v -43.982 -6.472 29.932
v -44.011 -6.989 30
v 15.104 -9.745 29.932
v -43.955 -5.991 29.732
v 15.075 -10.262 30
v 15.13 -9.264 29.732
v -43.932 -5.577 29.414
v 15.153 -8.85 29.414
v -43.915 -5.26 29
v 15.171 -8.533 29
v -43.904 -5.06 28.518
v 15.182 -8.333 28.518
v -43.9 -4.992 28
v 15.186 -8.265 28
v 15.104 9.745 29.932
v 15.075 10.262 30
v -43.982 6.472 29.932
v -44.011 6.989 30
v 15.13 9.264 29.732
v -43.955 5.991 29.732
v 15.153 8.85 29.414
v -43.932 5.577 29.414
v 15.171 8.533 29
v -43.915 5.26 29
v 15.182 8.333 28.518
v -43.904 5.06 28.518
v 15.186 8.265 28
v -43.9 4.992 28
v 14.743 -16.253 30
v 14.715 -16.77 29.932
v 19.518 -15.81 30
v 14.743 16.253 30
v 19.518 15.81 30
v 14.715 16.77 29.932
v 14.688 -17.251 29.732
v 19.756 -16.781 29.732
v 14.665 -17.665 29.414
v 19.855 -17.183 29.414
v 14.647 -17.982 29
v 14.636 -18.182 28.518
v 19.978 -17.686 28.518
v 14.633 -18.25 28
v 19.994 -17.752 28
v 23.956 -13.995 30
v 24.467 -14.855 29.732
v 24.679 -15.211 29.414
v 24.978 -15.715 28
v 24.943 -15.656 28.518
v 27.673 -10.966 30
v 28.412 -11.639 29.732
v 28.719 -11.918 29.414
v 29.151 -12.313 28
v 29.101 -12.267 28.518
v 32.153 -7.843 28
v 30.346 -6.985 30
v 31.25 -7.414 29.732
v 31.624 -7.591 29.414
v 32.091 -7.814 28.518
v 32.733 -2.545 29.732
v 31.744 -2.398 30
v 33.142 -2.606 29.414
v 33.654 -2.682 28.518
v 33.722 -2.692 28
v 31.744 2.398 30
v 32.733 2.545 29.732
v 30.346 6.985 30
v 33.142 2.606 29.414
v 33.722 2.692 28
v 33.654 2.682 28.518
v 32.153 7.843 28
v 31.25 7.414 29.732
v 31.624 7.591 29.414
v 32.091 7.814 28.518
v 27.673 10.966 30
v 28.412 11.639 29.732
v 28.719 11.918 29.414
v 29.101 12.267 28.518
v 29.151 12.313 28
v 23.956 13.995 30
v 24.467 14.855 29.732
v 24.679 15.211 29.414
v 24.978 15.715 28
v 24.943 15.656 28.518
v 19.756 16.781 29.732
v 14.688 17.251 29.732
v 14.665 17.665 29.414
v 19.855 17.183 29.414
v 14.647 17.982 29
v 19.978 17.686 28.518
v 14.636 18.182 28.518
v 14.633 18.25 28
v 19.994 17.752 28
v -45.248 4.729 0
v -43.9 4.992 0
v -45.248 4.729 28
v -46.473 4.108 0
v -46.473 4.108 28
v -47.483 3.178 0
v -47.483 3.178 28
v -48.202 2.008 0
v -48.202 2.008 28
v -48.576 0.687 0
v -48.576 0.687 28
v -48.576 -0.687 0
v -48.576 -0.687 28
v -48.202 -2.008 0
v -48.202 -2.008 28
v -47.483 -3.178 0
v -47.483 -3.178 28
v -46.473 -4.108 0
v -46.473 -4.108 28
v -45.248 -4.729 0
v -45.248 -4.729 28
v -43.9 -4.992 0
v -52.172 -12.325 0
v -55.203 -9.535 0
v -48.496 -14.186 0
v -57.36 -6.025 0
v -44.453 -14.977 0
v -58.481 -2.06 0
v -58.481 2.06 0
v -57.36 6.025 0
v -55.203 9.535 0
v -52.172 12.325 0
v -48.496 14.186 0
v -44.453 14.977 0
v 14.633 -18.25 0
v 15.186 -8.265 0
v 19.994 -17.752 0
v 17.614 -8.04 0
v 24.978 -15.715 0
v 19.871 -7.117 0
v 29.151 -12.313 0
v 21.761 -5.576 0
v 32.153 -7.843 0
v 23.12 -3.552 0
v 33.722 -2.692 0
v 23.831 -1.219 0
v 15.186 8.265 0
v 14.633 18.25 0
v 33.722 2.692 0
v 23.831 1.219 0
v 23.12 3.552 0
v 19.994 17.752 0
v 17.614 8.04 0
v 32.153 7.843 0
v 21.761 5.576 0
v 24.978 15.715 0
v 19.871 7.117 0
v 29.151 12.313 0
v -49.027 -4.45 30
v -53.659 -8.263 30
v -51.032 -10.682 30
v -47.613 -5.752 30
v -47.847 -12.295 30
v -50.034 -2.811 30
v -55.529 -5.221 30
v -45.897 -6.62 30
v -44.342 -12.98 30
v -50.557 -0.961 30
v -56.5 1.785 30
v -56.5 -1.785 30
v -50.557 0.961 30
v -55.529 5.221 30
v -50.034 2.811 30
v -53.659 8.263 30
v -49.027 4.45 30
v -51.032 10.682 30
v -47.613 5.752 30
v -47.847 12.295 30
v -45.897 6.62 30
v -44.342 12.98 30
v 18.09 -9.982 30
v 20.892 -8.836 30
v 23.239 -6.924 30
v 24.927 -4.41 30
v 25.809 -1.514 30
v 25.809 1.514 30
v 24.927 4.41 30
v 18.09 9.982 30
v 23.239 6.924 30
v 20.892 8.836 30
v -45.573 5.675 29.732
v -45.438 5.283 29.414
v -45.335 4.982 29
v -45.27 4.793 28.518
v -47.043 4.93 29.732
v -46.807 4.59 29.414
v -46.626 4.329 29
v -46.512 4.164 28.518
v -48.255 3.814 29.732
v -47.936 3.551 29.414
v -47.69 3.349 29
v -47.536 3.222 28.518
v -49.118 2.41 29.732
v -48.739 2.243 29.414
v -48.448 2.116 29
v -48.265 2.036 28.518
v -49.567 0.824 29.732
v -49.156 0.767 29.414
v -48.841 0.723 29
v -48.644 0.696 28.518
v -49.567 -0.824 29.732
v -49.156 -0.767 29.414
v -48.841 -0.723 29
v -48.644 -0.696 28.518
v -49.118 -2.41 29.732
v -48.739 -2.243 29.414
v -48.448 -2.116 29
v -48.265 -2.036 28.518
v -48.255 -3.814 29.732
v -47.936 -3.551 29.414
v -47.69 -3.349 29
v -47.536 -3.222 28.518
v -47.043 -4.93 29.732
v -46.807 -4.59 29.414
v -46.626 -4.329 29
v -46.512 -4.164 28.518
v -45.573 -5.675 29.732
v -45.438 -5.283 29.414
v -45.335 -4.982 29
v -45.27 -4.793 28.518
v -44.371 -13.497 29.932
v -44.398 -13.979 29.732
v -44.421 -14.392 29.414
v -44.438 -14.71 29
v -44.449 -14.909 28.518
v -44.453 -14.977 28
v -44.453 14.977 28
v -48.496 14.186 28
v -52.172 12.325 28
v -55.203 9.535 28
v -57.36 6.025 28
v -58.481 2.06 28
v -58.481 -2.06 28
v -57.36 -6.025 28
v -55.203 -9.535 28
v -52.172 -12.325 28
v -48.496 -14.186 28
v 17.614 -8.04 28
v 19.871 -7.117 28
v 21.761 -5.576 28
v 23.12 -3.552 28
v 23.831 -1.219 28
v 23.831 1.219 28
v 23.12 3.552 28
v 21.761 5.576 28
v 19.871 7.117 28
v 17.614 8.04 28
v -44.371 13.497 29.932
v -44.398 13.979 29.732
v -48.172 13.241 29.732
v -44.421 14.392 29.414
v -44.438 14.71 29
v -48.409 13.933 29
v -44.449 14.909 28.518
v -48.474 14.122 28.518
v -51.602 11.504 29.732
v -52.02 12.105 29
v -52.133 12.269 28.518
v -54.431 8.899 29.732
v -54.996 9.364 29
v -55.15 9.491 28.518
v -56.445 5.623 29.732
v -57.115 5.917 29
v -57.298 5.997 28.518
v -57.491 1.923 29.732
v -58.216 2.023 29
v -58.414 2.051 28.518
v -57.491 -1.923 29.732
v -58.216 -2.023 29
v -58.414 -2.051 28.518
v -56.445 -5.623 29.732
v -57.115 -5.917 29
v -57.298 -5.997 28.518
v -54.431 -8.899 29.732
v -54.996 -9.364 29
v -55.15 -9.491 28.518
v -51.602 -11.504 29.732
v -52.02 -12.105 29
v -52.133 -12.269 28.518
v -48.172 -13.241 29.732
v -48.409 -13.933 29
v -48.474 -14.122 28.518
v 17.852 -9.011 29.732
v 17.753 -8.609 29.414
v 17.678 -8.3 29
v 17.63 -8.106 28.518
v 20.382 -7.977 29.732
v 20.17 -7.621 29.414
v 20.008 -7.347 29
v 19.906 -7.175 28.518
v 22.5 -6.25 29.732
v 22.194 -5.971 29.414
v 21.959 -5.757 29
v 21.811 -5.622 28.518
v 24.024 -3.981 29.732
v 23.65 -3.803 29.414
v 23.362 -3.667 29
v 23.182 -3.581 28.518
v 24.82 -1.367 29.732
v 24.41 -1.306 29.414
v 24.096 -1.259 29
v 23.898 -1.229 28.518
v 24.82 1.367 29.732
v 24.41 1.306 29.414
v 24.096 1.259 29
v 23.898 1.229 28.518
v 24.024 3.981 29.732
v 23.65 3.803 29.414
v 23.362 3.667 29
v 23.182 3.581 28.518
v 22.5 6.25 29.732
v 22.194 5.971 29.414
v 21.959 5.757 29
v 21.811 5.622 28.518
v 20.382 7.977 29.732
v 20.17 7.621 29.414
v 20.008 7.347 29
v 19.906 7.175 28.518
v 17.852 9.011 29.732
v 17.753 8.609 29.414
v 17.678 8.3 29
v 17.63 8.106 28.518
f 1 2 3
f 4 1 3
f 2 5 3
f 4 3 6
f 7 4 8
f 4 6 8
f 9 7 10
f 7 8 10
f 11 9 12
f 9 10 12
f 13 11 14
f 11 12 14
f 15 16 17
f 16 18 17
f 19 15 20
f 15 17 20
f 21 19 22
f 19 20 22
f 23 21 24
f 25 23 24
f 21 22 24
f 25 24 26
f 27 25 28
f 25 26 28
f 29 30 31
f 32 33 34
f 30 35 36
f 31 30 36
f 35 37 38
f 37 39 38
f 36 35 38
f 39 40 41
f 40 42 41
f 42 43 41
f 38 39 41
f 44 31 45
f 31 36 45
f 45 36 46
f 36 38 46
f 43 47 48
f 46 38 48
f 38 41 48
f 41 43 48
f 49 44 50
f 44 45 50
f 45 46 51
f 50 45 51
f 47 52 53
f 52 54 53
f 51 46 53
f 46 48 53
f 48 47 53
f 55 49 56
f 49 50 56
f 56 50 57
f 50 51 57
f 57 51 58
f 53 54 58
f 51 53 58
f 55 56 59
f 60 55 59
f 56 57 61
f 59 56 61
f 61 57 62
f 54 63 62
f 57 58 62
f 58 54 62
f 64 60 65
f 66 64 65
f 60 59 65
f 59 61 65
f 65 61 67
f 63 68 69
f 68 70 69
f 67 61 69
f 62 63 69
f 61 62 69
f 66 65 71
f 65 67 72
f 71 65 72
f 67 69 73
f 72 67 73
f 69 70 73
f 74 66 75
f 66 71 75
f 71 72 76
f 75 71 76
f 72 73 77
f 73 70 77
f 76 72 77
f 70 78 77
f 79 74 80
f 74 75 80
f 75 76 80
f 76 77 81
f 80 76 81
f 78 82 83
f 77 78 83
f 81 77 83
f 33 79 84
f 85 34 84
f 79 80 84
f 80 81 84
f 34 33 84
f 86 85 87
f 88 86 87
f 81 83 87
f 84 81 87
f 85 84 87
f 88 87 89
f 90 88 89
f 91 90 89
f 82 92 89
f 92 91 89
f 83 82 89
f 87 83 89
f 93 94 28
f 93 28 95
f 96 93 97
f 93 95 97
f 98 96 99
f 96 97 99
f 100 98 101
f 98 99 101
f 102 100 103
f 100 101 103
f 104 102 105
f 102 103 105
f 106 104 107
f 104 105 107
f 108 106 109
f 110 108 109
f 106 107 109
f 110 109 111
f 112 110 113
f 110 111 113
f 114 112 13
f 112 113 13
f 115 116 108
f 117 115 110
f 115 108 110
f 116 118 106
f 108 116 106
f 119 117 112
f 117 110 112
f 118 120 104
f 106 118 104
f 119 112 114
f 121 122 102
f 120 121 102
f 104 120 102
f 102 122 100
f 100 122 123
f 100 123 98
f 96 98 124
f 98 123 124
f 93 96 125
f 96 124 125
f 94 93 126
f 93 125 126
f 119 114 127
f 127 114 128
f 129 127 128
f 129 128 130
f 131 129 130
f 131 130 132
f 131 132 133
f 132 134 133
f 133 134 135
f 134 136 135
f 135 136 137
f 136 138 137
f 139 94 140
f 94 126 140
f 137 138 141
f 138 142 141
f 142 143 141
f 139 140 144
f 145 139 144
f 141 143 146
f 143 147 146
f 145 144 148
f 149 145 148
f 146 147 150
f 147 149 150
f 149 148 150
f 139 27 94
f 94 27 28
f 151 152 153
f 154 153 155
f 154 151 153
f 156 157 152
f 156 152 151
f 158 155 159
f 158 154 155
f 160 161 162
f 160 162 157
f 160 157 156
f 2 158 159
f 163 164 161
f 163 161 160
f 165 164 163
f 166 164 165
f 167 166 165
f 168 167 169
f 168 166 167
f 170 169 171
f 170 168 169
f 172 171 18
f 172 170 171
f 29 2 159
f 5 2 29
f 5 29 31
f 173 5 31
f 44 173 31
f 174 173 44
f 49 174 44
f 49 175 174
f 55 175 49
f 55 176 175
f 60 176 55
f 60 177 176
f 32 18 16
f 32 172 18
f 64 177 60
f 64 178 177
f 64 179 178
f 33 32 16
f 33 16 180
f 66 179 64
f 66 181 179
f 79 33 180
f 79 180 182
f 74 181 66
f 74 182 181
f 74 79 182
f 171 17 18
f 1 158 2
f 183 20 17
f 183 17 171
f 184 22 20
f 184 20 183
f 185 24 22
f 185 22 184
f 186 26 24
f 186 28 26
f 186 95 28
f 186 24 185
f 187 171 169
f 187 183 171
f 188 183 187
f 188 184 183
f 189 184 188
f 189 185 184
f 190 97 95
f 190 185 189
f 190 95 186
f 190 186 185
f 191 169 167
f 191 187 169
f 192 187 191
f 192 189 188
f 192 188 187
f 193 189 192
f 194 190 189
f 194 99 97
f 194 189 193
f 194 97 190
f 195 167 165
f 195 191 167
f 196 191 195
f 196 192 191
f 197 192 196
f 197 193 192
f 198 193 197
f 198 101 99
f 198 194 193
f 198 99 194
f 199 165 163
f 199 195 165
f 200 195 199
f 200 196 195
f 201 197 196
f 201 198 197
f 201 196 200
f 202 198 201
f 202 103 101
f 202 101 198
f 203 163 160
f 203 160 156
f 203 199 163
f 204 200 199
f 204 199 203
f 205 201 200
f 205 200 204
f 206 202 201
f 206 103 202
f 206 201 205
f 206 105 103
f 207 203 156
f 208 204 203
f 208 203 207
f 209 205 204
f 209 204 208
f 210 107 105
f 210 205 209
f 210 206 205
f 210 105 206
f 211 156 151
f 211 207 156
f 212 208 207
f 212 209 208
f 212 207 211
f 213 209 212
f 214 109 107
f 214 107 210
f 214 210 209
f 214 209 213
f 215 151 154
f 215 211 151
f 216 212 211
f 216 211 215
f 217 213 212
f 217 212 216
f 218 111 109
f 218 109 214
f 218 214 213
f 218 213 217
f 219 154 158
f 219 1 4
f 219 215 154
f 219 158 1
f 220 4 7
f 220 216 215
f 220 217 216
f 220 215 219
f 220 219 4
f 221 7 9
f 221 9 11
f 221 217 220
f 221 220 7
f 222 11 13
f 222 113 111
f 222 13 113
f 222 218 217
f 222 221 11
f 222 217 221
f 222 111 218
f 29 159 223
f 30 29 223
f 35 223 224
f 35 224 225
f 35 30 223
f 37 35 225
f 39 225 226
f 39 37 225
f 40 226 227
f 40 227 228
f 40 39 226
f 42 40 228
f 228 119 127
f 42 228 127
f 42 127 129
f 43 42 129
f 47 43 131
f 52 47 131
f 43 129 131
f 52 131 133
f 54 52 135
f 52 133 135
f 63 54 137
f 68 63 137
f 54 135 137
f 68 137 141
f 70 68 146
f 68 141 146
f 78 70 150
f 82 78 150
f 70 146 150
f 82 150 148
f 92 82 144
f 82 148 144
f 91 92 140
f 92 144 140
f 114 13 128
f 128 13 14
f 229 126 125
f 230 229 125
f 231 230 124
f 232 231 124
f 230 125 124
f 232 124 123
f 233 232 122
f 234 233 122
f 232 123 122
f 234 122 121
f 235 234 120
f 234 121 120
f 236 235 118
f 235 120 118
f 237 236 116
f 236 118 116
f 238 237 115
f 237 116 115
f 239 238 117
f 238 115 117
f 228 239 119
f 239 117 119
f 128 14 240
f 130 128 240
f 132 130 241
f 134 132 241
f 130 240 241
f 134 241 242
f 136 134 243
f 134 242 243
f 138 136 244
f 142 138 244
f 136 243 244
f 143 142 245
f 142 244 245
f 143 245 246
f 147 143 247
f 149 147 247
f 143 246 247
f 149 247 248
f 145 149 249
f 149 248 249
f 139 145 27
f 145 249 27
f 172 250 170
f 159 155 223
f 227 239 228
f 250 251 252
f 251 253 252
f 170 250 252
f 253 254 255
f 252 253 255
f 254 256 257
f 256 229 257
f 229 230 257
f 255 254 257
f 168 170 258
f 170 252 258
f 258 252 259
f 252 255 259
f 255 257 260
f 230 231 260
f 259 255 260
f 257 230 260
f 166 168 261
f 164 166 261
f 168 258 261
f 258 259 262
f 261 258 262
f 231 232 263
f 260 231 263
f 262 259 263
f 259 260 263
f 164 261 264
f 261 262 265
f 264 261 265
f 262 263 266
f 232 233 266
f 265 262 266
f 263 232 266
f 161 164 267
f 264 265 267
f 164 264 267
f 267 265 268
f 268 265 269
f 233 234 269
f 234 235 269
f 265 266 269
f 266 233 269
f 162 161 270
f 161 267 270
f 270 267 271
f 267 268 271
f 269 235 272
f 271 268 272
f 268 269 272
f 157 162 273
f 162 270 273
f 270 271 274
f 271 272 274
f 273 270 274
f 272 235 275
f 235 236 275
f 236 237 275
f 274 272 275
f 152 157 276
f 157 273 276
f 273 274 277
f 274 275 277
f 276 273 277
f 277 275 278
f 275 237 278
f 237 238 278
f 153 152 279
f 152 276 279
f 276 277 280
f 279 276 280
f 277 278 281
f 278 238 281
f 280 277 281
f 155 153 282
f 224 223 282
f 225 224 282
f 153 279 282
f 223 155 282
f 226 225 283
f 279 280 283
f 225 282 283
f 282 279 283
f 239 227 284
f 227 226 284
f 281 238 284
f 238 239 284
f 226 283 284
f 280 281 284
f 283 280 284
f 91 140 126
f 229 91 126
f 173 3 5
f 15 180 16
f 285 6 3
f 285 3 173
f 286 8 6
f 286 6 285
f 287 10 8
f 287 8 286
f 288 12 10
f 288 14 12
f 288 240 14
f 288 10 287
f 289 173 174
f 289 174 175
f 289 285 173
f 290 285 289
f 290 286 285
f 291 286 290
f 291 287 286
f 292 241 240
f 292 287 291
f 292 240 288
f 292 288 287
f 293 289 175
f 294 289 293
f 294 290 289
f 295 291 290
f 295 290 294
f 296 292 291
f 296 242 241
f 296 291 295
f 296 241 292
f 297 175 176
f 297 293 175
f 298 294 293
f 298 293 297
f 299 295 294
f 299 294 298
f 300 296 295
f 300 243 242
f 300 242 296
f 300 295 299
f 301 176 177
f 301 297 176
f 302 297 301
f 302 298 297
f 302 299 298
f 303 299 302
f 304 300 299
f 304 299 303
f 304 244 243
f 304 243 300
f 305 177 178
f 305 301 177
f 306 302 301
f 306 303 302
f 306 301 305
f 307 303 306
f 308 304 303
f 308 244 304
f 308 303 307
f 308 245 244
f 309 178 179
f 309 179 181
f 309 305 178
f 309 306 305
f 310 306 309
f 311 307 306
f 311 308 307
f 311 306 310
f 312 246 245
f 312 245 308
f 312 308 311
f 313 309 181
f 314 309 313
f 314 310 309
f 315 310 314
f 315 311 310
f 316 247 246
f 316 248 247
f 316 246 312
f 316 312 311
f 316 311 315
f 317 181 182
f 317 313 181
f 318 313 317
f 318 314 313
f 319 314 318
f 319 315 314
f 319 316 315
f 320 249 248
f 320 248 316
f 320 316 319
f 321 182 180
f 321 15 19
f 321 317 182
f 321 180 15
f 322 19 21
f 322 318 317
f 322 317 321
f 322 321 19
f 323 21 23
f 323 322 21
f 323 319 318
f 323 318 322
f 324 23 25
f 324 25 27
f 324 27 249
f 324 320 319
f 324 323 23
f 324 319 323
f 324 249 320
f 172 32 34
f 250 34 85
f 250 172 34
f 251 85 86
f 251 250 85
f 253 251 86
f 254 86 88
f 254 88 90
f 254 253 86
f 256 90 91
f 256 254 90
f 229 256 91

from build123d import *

# Parameters (mm, degrees)
F1_DEPTH = 30
F3_DEPTH = 30
F4_R     = 2


with BuildPart() as f1:
    # F0 (on Top) → F1 (new body)
    with BuildSketch(Plane.XY):
        with BuildLine():
            Line((14.632652, 18.249727), (-44.452963, 14.977043))
            ThreePointArc((-44.452963, 14.977043), (-58.623402, 0), (-44.452963, -14.977043))
            Line((-44.452963, -14.977043), (14.632652, -18.249727))
            ThreePointArc((14.632652, -18.249727), (33.921183, 0), (14.632652, 18.249727))
        make_face()
    extrude(amount=F1_DEPTH)

    # F2 (on face) → F3 (cut)
    with BuildSketch(Plane.XY.offset(30)):
        with BuildLine():
            ThreePointArc((-43.899922, 4.992348), (-48.623402, 0), (-43.899922, -4.992348))
            Line((-43.899922, -4.992348), (15.185693, -8.265031))
            ThreePointArc((15.185693, -8.265031), (23.921183, 0), (15.185693, 8.265031))
            Line((15.185693, 8.265031), (-43.899922, 4.992348))
        make_face()
    extrude(amount=-F3_DEPTH, mode=Mode.SUBTRACT)

    # F4
    f4_edges = [f1.edges().sort_by_distance(p)[0] for p in [
        (-48.623402, 0, 30),
        (23.921183, 0, 30),
        (-14.357115, 6.62869, 30),
        (-14.910155, -16.613385, 30),
        (33.921183, 0, 30),
        (-14.910155, 16.613385, 30),
        (-58.623402, 0, 30),
        (-14.357115, -6.62869, 30),
    ]]
    fillet(f4_edges, radius=F4_R)


solid = f1.part
